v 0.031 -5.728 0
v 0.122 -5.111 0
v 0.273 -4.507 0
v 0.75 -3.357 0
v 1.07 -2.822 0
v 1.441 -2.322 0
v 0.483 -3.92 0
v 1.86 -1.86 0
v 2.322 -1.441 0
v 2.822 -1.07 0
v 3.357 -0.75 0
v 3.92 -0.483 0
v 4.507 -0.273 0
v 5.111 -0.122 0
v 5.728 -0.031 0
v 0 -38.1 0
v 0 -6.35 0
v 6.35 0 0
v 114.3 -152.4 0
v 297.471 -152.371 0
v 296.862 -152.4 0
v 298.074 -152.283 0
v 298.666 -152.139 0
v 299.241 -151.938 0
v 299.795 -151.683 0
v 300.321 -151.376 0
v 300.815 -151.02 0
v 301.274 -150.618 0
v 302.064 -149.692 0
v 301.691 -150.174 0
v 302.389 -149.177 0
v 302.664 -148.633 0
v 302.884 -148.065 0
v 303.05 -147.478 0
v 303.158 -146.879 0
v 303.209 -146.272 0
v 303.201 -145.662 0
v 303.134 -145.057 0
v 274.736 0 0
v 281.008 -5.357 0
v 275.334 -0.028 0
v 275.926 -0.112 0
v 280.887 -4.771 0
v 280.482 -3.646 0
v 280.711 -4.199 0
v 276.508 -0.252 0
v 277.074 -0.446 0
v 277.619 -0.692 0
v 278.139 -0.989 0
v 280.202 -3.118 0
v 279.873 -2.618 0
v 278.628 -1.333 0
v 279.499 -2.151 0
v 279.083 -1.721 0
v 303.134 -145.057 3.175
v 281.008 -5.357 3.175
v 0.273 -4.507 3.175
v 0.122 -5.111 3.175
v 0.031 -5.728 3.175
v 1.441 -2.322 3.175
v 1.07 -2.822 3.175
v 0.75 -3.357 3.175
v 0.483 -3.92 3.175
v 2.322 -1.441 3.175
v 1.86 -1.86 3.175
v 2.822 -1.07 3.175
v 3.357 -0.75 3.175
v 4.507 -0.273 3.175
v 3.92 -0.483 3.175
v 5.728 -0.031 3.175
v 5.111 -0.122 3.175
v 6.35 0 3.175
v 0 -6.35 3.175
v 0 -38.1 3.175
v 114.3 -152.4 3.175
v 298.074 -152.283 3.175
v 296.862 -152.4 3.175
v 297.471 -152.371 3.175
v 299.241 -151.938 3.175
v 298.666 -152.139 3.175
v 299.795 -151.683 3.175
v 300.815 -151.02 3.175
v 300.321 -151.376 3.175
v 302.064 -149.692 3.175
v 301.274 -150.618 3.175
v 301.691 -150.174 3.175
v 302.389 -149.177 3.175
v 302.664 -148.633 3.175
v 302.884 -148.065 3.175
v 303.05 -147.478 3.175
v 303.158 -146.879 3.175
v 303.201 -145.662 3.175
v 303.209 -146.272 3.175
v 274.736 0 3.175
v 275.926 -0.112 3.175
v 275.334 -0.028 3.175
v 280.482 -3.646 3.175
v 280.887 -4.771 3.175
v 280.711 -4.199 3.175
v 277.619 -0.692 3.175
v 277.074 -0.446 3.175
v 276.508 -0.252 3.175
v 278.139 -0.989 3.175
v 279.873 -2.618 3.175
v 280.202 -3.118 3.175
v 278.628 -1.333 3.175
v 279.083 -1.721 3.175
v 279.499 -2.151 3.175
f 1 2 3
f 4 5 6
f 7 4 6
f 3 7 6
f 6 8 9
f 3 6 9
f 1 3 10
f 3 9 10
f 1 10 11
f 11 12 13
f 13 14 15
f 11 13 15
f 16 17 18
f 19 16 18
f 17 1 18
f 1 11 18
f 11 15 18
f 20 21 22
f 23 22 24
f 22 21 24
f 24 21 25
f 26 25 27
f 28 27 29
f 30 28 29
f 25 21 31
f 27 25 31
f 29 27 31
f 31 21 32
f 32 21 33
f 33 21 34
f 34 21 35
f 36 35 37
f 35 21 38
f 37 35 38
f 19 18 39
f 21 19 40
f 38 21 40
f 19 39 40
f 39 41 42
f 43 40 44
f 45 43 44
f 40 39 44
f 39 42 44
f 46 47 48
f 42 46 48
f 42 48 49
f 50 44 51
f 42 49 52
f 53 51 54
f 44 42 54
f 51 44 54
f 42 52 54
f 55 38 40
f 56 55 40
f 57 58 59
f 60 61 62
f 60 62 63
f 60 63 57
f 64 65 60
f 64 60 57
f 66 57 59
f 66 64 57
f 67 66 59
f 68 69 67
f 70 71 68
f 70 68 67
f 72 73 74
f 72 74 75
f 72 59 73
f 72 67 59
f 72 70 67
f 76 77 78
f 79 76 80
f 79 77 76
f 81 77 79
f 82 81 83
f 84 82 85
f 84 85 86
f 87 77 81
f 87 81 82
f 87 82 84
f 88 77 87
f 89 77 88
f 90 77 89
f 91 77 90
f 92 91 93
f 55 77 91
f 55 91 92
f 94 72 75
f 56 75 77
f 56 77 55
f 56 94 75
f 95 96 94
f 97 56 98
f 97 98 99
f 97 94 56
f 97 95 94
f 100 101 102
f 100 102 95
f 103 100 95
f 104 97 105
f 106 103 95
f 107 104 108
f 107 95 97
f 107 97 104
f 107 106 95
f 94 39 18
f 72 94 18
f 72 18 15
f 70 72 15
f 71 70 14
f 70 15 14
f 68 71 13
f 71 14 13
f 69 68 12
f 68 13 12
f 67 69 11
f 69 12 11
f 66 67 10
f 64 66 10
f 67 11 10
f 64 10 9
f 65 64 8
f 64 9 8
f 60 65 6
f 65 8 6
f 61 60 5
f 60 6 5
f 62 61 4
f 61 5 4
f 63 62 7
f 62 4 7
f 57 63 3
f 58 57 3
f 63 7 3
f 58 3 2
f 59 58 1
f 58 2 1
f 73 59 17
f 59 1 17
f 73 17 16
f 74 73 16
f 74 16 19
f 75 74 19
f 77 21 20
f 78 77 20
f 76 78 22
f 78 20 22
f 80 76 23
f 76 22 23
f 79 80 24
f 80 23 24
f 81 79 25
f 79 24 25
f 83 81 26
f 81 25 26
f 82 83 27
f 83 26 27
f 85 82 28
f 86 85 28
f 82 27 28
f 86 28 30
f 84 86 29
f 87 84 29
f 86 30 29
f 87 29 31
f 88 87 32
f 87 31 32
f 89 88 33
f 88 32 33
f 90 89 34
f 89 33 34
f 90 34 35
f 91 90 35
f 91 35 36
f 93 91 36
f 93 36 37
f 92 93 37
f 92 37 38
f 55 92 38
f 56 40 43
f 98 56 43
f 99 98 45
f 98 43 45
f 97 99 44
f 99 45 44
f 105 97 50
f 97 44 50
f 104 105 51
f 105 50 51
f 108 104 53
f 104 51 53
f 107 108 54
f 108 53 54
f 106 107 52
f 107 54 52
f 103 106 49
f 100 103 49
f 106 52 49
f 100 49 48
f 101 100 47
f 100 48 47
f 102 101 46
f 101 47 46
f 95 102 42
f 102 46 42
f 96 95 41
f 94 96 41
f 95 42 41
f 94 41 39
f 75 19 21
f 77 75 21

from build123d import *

# Parameters (mm, degrees)
BOSS_EXTRUDE1_DEPTH = 3.175


with BuildPart() as part:
    # Sketch1 → Boss-Extrude1 (new body)
    with BuildSketch(Plane.XY):
        with BuildLine():
            Line((0, -6.35), (0, -38.1))
            Line((0, -38.1), (114.3, -152.4))
            Line((114.3, -152.4), (296.8625, -152.4))
            ThreePointArc((296.8625, -152.4), (301.691077882, -150.173995107), (303.134320963, -145.056641147))
            Line((303.134320963, -145.056641147), (281.008014649, -5.356641147))
            ThreePointArc((281.008014649, -5.356641147), (278.860188794, -1.521422118), (274.736193687, 0))
            Line((274.736193687, 0), (6.35, 0))
            ThreePointArc((6.35, 0), (1.859871939, -1.859871939), (0, -6.35))
        make_face()
    extrude(amount=BOSS_EXTRUDE1_DEPTH)


solid = part.part
